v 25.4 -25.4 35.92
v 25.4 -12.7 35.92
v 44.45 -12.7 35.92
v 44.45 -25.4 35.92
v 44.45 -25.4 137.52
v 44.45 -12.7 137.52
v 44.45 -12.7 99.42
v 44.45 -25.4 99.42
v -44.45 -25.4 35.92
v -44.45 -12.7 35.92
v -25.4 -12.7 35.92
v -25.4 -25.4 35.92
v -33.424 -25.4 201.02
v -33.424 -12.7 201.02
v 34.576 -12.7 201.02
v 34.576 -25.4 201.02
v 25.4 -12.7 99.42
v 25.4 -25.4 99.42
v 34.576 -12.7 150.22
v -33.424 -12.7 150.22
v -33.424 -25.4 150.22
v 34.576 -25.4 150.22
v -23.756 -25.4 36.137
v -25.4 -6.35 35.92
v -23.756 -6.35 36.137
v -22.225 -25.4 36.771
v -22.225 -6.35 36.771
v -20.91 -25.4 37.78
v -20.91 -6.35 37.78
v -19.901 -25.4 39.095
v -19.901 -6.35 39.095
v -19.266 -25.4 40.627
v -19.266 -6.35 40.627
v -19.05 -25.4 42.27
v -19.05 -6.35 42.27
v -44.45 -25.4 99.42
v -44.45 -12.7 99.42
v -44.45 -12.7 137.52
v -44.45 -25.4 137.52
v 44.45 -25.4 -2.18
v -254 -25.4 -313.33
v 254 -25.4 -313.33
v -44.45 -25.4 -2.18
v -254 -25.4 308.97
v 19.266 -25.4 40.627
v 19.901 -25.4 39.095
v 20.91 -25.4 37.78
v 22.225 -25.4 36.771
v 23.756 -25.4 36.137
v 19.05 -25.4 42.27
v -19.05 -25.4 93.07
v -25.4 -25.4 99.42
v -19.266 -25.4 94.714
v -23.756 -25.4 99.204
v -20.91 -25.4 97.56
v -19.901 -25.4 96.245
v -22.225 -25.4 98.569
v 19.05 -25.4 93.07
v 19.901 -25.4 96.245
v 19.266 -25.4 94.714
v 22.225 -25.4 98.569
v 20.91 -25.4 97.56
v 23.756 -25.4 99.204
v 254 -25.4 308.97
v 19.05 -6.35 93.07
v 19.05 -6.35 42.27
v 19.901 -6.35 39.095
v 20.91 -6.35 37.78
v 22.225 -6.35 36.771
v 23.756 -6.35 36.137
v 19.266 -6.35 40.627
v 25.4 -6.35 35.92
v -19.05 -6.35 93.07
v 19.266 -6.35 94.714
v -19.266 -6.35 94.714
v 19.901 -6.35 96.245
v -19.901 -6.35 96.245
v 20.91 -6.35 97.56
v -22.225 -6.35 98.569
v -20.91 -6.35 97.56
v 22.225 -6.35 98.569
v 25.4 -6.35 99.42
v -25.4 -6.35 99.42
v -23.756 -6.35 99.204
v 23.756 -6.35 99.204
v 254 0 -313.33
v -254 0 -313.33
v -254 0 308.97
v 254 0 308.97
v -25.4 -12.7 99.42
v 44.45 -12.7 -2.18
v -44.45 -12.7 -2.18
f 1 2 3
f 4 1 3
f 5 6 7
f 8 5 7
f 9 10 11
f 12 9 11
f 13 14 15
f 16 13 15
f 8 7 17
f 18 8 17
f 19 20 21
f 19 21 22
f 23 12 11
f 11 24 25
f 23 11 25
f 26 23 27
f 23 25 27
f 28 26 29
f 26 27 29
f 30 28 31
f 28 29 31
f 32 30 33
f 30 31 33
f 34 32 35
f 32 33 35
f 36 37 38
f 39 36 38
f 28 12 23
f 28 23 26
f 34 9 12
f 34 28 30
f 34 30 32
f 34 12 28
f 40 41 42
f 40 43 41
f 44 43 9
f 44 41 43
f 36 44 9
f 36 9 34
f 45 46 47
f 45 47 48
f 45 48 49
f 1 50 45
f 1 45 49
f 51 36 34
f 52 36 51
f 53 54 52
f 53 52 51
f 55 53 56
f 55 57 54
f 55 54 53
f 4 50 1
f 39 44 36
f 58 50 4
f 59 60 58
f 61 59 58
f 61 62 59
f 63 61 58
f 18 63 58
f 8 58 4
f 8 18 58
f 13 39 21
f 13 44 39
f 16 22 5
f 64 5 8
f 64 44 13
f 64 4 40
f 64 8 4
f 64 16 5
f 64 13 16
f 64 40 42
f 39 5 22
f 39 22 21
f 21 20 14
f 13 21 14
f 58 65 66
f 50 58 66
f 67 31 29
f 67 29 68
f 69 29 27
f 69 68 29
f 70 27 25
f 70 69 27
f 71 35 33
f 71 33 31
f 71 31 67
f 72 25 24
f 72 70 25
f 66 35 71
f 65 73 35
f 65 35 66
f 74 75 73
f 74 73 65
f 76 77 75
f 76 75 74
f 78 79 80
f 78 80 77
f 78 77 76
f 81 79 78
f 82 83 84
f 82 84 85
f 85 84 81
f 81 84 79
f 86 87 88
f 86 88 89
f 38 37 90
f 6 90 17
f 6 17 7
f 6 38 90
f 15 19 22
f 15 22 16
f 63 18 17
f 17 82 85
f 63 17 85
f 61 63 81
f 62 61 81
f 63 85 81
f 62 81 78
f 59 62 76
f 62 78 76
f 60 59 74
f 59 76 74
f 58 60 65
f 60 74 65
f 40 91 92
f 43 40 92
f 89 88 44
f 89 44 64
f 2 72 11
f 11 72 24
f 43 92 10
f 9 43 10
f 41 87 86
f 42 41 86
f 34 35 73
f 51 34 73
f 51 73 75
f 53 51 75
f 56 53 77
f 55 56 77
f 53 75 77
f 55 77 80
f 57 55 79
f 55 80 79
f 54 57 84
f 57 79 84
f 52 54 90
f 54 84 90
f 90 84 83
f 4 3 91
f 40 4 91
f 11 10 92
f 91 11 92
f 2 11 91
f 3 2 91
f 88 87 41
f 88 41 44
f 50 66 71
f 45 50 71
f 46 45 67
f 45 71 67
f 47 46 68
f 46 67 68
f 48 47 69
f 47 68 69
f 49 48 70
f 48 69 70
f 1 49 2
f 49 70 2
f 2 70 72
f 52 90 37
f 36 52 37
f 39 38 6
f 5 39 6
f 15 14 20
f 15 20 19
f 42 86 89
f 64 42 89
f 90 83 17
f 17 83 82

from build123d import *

# Parameters (mm, degrees)
F0_W     = 508
F0_H     = 622.3
F0_W_2   = 68
F0_H_2   = 50.8
F1_DEPTH = 25.4
F2_DEPTH = 12.7
F3_DEPTH = 6.35


with BuildPart() as f1:
    # F0 (on Front) → F1 (new body)
    with BuildSketch(Plane.XZ):
        with Locations((0, -2.179809)):
            Rectangle(F0_W, F0_H)
        with BuildLine():
            Line((-44.45, 99.420191), (-44.45, 137.520191))
            Line((-44.45, 137.520191), (44.45, 137.520191))
            Line((44.45, 137.520191), (44.45, 99.420191))
            Line((44.45, 99.420191), (25.4, 99.420191))
            ThreePointArc((25.4, 99.420191), (20.909872, 97.560319), (19.05, 93.070191))
            Line((19.05, 93.070191), (19.05, 42.270191))
            ThreePointArc((19.05, 42.270191), (20.909872, 37.780063), (25.4, 35.920191))
            Line((25.4, 35.920191), (44.45, 35.920191))
            Line((44.45, 35.920191), (44.45, -2.179809))
            Line((44.45, -2.179809), (-44.45, -2.179809))
            Line((-44.45, -2.179809), (-44.45, 35.920191))
            Line((-44.45, 35.920191), (-25.4, 35.920191))
            ThreePointArc((-25.4, 35.920191), (-20.909872, 37.780063), (-19.05, 42.270191))
            Line((-19.05, 42.270191), (-19.05, 93.070191))
            ThreePointArc((-19.05, 93.070191), (-20.909872, 97.560319), (-25.4, 99.420191))
            Line((-25.4, 99.420191), (-44.45, 99.420191))
        make_face(mode=Mode.SUBTRACT)
        with Locations((0.576081, 175.620191)):
            Rectangle(F0_W_2, F0_H_2, mode=Mode.SUBTRACT)
    extrude(amount=F1_DEPTH)

    # F0 (on Front) → F2 (join)
    with BuildSketch(Plane.XZ):
        with Locations((0.576081, 175.620191)):
            Rectangle(F0_W_2, F0_H_2)
        Polygon((44.45, 137.520191), (-44.45, 137.520191), (-44.45, 99.420191), (-25.4, 99.420191), (25.4, 99.420191), (44.45, 99.420191), align=None)
        Polygon((25.4, 35.920191), (-25.4, 35.920191), (-44.45, 35.920191), (-44.45, -2.179809), (44.45, -2.179809), (44.45, 35.920191), align=None)
    extrude(amount=F2_DEPTH)

    # F0 (on Front) → F3 (join)
    with BuildSketch(Plane.XZ):
        with BuildLine():
            Line((25.4, 99.420191), (-25.4, 99.420191))
            ThreePointArc((-25.4, 99.420191), (-20.909872, 97.560319), (-19.05, 93.070191))
            Line((-19.05, 93.070191), (-19.05, 42.270191))
            ThreePointArc((-19.05, 42.270191), (-20.909872, 37.780063), (-25.4, 35.920191))
            Line((-25.4, 35.920191), (25.4, 35.920191))
            ThreePointArc((25.4, 35.920191), (20.909872, 37.780063), (19.05, 42.270191))
            Line((19.05, 42.270191), (19.05, 93.070191))
            ThreePointArc((19.05, 93.070191), (20.909872, 97.560319), (25.4, 99.420191))
        make_face()
    extrude(amount=F3_DEPTH)


solid = f1.part
